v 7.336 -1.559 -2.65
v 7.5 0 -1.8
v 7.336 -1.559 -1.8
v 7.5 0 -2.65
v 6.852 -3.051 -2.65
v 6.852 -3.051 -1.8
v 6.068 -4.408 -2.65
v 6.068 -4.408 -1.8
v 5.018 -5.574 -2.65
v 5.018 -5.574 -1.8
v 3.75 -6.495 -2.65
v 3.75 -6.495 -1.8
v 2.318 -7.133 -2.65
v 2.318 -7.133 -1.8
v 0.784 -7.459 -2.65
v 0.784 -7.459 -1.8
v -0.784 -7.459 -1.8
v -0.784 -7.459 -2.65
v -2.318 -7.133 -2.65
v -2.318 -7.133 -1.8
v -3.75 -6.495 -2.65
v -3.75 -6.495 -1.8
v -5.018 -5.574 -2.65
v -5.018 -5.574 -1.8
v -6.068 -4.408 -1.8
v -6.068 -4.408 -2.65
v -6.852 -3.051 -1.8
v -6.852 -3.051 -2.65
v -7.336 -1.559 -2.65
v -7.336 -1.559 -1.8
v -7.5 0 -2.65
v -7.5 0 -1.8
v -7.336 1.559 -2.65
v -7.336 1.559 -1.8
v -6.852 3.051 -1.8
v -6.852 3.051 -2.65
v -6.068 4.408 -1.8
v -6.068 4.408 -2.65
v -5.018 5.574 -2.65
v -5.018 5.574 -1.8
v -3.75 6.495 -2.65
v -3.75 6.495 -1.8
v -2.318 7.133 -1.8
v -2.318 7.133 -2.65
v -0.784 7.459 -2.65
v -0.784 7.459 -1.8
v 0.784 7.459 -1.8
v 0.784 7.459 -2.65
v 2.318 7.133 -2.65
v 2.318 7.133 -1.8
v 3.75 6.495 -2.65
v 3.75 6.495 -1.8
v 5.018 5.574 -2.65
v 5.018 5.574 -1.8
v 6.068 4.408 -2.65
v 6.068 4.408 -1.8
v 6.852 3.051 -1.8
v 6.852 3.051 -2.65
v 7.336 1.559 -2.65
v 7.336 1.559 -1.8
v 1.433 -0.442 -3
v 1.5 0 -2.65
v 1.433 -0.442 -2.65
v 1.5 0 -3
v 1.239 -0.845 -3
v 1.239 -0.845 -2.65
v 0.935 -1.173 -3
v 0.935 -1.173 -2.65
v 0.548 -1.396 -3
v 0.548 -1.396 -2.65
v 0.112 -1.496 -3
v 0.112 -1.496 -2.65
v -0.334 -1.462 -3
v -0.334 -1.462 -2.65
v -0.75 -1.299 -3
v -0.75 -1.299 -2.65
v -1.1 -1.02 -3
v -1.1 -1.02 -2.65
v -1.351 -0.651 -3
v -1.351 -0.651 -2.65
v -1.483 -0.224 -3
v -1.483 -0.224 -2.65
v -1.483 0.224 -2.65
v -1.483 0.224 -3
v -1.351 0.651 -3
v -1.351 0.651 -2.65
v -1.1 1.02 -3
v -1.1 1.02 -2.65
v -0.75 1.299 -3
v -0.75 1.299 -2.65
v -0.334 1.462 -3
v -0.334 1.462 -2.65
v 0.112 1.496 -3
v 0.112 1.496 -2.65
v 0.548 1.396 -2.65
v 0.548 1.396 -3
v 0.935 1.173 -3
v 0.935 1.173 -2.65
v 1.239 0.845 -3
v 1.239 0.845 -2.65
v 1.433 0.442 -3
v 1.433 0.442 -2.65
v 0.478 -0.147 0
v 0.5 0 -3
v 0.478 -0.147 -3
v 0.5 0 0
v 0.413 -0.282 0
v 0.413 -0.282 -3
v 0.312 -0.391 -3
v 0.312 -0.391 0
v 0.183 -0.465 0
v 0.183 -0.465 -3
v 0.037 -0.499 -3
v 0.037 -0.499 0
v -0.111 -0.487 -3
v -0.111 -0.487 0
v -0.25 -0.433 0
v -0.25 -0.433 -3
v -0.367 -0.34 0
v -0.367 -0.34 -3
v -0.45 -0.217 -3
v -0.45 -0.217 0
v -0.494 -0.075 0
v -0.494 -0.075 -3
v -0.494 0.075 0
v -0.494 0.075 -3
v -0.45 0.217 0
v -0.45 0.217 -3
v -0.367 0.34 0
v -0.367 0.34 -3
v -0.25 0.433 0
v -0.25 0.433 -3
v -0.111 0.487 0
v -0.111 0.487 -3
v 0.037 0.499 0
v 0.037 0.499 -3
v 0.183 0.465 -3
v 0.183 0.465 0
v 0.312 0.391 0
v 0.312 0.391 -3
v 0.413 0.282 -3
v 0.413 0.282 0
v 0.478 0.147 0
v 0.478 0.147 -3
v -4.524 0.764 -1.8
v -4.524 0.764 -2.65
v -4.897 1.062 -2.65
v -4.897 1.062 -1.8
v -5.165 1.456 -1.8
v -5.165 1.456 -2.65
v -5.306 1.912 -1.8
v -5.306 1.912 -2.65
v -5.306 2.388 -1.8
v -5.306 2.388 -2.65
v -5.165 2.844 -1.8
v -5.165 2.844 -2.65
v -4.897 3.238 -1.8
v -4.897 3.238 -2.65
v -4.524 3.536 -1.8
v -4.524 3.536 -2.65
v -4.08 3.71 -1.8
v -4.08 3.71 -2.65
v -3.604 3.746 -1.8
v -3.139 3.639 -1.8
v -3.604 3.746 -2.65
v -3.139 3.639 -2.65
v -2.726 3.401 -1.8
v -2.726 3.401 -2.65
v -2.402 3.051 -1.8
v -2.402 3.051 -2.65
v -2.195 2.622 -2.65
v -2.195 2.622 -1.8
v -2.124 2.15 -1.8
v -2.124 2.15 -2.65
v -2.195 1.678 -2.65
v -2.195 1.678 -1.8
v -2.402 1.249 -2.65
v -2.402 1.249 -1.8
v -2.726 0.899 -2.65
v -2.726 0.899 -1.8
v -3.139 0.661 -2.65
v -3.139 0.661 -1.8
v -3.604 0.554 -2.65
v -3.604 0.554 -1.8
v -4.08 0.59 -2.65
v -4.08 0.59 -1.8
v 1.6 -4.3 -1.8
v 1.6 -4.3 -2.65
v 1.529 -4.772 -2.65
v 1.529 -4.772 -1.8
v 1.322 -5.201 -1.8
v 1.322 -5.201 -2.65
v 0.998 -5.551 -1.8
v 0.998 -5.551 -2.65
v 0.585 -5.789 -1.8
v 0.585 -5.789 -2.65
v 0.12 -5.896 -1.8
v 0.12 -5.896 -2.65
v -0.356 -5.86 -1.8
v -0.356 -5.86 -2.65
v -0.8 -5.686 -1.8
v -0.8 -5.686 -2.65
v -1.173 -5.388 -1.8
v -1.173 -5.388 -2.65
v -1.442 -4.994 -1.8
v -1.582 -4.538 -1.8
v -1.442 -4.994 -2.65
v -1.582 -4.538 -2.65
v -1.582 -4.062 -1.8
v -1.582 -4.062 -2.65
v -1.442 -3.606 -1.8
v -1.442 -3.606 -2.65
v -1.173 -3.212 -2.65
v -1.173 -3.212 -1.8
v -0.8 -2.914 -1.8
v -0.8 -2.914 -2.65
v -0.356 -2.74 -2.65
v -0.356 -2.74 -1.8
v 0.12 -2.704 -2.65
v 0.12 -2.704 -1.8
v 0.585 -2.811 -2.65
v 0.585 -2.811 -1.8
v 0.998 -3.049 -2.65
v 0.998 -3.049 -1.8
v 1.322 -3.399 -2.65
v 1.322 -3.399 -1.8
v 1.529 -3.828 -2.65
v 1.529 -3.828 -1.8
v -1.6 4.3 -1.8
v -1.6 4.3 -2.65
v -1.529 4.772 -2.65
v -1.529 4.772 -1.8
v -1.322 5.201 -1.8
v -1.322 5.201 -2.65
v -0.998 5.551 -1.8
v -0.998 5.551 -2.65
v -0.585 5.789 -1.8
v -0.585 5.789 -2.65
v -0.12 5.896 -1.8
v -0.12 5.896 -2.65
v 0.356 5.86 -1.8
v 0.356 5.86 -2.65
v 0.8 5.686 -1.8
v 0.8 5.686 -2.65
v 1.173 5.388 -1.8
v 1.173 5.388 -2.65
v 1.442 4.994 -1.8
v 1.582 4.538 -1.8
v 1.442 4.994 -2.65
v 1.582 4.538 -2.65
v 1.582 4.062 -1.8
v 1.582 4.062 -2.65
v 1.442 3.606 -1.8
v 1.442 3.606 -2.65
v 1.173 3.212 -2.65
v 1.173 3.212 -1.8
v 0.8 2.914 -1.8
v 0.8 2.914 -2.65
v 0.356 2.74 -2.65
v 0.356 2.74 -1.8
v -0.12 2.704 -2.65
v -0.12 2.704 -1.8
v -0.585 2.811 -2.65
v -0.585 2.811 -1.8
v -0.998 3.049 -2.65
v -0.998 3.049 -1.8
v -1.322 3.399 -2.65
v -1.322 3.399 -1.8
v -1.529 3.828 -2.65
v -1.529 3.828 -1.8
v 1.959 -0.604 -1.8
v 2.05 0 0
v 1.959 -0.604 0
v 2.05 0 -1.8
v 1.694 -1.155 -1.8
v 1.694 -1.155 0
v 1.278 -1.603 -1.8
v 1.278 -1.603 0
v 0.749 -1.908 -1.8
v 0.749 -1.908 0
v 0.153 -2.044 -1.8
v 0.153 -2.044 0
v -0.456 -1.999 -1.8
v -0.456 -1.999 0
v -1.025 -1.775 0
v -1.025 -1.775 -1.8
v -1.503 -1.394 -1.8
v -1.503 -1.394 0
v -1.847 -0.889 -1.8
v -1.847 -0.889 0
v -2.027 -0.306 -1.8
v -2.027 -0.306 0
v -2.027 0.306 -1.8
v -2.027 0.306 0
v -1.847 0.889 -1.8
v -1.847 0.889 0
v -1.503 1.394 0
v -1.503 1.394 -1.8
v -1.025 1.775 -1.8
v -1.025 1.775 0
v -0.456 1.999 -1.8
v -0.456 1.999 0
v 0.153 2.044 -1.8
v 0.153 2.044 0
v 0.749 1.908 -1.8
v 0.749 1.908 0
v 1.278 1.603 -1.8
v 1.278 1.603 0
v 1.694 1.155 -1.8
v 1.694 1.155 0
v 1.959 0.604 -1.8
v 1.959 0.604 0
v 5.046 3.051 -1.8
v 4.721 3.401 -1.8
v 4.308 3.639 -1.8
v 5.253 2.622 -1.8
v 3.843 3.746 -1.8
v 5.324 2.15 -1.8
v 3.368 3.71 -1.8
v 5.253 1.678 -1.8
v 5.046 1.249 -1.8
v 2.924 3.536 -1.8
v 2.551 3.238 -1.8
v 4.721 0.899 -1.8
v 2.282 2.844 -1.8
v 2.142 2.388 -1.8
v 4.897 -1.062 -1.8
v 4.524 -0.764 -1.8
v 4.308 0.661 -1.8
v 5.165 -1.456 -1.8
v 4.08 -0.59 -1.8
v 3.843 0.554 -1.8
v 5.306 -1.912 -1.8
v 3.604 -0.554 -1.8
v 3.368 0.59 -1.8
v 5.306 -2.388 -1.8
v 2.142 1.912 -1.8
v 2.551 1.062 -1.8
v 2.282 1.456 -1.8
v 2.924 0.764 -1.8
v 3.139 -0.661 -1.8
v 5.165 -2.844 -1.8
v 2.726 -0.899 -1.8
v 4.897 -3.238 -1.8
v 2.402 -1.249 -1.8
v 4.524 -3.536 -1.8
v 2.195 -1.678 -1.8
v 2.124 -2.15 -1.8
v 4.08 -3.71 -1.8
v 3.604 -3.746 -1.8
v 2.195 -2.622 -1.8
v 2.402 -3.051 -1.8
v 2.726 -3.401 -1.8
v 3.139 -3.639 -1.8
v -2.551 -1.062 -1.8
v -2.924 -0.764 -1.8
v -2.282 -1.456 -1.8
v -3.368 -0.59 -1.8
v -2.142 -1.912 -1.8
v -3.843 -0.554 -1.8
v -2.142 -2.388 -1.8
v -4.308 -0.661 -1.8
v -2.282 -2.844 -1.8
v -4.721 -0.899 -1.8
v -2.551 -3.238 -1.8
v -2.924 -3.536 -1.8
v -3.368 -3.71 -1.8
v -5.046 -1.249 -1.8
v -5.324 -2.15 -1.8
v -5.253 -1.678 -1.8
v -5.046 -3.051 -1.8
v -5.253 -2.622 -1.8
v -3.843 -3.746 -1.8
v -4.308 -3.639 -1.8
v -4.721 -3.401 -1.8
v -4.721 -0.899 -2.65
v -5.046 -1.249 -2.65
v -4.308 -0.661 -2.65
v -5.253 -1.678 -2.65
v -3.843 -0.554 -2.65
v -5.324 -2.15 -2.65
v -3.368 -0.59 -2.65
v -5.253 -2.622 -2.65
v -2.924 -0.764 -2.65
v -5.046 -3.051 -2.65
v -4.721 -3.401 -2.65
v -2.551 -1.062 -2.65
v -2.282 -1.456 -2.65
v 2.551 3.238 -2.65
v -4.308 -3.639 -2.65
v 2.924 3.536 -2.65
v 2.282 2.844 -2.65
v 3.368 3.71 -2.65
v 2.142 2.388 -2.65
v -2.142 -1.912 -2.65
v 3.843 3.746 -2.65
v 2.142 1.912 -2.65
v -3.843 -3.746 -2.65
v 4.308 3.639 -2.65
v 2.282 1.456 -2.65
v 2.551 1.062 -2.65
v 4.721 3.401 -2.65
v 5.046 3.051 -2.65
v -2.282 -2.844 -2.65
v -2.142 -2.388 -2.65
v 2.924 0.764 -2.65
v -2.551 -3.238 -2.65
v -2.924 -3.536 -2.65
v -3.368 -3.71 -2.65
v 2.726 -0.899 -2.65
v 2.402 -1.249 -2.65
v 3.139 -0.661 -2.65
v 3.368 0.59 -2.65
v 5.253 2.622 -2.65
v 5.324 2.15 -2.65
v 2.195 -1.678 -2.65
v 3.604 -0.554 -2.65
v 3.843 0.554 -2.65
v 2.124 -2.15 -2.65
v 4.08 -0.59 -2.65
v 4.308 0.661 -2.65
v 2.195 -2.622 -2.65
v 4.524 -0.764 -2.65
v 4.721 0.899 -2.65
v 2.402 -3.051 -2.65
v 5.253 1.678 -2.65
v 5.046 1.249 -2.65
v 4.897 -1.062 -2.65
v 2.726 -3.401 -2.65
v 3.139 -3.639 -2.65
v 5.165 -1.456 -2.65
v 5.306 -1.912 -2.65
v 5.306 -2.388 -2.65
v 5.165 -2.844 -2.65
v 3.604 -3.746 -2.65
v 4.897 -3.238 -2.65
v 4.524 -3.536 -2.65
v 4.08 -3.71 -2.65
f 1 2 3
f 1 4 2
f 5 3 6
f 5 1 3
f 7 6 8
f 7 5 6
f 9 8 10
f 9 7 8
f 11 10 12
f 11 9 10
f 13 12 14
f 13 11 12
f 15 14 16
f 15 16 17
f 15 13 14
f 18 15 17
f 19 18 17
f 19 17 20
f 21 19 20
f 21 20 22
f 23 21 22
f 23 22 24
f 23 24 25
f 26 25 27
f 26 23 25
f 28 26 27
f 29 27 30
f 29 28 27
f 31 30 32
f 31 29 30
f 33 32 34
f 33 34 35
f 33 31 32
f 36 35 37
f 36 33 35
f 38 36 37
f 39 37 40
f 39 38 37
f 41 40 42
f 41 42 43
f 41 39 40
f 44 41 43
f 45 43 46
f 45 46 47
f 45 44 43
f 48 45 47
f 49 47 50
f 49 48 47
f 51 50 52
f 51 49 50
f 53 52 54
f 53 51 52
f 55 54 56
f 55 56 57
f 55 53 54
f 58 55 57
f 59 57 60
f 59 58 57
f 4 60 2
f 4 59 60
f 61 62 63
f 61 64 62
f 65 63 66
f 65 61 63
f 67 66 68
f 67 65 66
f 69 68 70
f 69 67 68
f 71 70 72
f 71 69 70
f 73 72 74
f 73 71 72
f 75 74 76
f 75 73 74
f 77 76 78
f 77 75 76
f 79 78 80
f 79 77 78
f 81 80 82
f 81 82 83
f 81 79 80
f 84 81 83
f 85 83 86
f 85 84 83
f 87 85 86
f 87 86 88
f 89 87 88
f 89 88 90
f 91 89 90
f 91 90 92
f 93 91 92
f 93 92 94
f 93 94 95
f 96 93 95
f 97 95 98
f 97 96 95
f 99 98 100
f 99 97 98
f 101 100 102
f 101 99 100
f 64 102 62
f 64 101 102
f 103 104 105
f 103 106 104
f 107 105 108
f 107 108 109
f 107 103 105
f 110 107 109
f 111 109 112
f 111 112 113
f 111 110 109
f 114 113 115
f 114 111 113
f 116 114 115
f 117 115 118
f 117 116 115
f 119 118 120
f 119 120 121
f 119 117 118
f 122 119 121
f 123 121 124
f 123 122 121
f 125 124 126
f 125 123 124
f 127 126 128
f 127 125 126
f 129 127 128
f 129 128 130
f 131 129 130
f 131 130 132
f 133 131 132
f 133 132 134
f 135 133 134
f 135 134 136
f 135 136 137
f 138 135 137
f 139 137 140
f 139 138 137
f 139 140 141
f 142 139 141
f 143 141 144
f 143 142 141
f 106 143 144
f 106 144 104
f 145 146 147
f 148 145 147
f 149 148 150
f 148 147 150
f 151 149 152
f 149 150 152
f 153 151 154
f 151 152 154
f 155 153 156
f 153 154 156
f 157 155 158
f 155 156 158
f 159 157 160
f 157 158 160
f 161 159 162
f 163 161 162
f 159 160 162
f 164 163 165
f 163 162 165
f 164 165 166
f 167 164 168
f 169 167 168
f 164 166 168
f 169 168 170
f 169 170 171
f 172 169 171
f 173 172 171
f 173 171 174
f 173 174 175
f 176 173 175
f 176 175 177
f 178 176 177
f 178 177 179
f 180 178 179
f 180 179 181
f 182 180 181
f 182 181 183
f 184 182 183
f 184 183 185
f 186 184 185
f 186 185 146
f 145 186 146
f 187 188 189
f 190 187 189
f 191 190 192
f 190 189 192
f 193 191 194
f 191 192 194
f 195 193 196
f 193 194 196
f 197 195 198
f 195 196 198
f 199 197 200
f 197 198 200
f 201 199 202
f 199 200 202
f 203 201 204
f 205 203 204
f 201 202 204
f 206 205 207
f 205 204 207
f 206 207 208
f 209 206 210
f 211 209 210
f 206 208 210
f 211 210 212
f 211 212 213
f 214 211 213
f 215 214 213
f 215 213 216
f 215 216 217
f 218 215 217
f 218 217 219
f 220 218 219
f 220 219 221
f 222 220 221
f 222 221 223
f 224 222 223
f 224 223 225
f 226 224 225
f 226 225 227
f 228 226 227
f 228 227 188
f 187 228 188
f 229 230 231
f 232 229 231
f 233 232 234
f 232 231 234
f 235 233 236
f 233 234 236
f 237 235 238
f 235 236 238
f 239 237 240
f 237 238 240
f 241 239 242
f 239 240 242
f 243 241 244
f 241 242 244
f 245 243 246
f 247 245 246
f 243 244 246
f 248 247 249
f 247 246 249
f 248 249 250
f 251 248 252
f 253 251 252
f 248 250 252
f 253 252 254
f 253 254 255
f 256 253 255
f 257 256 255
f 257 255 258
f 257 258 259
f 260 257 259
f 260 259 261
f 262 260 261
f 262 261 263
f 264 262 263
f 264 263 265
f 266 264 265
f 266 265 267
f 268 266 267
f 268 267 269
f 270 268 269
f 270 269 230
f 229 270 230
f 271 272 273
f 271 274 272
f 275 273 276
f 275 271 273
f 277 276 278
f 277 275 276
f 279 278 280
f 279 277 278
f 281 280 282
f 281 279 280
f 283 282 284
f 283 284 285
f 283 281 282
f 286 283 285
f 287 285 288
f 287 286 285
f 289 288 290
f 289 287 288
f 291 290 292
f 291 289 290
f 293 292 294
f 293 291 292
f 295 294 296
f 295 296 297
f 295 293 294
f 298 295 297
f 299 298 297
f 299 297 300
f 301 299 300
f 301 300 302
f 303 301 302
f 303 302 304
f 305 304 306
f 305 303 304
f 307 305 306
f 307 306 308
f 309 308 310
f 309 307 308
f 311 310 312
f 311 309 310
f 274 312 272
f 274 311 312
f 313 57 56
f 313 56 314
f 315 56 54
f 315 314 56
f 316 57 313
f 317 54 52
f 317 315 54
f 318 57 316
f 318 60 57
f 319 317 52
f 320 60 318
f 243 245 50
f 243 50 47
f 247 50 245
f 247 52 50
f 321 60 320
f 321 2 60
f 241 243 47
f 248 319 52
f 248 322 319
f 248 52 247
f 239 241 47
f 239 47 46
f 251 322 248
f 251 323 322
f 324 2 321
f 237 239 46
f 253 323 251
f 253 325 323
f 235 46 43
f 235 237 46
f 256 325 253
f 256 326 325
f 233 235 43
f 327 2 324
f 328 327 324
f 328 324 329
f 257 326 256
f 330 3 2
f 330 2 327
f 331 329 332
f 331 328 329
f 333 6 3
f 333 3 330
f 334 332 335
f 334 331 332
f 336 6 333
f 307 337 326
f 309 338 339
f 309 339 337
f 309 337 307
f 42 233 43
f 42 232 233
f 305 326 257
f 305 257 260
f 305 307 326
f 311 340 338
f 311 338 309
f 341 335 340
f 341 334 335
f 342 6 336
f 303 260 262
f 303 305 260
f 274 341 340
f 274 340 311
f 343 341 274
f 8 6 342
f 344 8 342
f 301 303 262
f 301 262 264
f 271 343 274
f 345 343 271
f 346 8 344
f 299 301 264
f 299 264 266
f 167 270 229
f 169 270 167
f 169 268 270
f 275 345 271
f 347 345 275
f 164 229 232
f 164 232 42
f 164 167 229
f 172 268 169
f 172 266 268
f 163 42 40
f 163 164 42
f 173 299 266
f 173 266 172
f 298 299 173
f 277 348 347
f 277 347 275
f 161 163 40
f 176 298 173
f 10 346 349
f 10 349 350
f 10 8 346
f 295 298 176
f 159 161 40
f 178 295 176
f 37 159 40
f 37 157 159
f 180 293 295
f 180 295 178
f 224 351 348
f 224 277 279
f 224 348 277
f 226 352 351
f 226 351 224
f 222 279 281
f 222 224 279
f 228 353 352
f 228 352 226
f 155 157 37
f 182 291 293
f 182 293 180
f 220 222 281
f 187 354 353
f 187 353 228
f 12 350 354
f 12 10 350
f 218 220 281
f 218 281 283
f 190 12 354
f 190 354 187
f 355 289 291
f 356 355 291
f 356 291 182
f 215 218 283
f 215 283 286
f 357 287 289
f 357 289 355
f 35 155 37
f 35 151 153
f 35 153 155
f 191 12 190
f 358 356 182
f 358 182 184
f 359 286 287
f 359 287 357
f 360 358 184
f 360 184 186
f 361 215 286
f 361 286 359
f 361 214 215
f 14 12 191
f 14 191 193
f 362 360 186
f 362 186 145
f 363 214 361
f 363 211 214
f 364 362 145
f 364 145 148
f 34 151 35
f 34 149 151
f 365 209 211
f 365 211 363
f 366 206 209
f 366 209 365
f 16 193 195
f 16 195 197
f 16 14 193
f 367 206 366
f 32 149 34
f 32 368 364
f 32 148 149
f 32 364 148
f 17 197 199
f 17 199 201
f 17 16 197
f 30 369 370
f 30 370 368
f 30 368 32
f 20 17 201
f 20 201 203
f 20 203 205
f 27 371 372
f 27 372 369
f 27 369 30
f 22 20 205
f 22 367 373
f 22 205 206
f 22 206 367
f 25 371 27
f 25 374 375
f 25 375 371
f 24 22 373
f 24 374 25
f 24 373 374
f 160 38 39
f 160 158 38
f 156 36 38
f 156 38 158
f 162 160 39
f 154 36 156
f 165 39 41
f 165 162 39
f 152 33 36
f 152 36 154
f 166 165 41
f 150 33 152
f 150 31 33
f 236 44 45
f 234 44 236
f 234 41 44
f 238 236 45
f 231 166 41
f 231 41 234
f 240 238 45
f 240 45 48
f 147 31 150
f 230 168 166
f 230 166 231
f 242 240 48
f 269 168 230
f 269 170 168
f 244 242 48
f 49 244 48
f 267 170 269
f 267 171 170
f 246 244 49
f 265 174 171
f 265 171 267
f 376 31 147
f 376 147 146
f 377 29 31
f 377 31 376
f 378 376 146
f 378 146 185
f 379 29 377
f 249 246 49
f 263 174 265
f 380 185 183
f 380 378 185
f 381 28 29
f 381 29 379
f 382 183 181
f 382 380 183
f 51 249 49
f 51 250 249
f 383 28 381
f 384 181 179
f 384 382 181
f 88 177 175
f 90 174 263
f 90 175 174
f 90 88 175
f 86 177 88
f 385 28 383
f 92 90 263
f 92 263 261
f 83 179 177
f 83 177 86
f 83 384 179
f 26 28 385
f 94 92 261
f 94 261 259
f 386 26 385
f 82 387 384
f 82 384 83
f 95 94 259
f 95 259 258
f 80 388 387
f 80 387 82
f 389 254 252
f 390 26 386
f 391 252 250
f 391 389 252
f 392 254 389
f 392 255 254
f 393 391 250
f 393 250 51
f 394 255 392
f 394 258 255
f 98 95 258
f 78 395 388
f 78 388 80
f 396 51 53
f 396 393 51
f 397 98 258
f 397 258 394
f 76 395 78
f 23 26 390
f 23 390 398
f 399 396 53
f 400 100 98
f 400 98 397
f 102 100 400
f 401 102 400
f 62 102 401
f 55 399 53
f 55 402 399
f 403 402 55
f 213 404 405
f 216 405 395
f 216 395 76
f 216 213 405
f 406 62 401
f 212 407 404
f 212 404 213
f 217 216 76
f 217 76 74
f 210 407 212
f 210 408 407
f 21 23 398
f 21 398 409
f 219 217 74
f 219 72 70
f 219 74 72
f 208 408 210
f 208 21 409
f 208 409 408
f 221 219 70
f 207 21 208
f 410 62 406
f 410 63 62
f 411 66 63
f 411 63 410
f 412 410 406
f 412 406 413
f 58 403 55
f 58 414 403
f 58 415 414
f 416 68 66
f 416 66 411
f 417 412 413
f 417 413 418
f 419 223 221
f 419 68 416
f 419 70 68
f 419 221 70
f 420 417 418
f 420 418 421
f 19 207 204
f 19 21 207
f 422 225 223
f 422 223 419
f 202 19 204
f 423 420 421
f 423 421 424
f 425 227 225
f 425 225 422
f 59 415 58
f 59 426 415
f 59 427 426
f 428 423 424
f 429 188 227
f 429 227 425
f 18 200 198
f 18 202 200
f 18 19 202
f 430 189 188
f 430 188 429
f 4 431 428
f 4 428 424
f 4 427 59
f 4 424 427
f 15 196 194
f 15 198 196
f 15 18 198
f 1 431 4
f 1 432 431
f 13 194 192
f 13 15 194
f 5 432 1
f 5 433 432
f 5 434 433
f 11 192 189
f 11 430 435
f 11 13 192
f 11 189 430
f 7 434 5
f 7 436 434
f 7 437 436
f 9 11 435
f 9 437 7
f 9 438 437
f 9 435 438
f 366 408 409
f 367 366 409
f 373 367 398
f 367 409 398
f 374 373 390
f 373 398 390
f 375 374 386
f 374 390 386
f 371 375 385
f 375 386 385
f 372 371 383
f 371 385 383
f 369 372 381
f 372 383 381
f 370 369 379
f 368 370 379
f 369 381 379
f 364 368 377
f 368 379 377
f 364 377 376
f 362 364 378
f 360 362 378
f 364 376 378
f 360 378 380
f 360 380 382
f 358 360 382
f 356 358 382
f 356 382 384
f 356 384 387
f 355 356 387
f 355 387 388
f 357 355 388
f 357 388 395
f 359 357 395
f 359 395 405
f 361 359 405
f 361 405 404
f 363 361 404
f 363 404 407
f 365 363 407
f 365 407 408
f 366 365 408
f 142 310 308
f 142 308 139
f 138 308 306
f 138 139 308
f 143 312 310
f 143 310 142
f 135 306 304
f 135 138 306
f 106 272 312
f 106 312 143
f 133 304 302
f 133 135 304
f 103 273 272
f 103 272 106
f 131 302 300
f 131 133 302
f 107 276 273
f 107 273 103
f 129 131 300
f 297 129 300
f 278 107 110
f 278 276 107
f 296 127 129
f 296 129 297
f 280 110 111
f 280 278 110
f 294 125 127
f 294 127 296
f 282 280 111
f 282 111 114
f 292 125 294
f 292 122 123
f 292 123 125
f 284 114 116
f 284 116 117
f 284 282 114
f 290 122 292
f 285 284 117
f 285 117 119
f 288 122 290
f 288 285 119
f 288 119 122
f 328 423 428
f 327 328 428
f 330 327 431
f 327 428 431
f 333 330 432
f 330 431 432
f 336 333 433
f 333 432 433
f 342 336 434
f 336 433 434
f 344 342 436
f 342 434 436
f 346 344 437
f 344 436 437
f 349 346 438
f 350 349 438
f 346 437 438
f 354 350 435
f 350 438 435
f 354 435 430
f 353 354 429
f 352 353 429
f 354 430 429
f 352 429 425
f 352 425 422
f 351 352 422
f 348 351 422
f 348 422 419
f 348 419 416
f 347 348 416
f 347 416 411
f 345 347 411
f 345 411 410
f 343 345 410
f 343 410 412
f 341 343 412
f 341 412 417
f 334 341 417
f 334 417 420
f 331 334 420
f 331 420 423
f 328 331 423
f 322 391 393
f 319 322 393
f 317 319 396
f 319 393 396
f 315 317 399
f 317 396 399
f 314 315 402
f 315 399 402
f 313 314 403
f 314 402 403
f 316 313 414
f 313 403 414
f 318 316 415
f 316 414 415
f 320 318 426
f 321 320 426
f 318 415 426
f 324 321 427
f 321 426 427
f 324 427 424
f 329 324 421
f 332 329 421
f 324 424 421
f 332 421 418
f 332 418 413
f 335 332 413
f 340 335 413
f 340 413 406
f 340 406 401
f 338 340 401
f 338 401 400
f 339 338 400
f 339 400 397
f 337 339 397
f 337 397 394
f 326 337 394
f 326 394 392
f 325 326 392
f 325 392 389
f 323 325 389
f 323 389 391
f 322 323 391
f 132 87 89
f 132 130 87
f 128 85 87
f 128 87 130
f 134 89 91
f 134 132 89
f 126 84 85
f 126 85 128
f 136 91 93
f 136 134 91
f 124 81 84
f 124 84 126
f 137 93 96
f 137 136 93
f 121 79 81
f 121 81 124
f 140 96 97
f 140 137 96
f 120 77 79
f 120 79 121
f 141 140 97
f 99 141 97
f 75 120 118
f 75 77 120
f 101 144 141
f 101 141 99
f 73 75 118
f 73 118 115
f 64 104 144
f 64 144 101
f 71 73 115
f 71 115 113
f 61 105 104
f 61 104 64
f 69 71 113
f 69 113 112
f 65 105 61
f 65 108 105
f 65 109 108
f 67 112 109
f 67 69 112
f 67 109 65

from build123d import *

# Parameters (mm, degrees)
SKETCH3_R          = 1.6
CUT_EXTRUDE1_DEPTH = 11.932634632
CIRPATTERN1_COUNT  = 6


with BuildPart() as part:
    # Sketch1 → Revolve1 (revolve)
    with BuildSketch(Plane(origin=(0, 0, 0), x_dir=(0, 0, -1), z_dir=(1, 0, 0)), mode=Mode.PRIVATE) as revolve1_sk:
        Polygon((0, 0.5), (0, 2.05), (1.8, 2.05), (1.8, 7.5), (2.65, 7.5), (2.65, 1.5), (3, 1.5), (3, 0.5), align=None)
    revolve(revolve1_sk.sketch.rotate(Axis((0, 0, 128.698308515), (0, 0, -1)), 90), axis=Axis((0, 0, 128.698308515), (0, 0, -1)))

    # Sketch3 → Cut-Extrude1 (cut, through all)
    with BuildSketch(Plane(origin=(0, 0, -2.65), x_dir=(-1, 0, 0), z_dir=(0, 0, -1))):
        with Locations((0, 4.3)):
            Circle(SKETCH3_R)
    cut_extrude1 = extrude(amount=-CUT_EXTRUDE1_DEPTH, mode=Mode.SUBTRACT)

    # CirPattern1: Cut-Extrude1 ×6 about axis
    cirpattern1_axis = Axis((0, 0, 0), (0, 0, 1))
    for i in range(1, CIRPATTERN1_COUNT):
        add(cut_extrude1.rotate(cirpattern1_axis, i * 360 / CIRPATTERN1_COUNT), mode=Mode.SUBTRACT)


solid = part.part
